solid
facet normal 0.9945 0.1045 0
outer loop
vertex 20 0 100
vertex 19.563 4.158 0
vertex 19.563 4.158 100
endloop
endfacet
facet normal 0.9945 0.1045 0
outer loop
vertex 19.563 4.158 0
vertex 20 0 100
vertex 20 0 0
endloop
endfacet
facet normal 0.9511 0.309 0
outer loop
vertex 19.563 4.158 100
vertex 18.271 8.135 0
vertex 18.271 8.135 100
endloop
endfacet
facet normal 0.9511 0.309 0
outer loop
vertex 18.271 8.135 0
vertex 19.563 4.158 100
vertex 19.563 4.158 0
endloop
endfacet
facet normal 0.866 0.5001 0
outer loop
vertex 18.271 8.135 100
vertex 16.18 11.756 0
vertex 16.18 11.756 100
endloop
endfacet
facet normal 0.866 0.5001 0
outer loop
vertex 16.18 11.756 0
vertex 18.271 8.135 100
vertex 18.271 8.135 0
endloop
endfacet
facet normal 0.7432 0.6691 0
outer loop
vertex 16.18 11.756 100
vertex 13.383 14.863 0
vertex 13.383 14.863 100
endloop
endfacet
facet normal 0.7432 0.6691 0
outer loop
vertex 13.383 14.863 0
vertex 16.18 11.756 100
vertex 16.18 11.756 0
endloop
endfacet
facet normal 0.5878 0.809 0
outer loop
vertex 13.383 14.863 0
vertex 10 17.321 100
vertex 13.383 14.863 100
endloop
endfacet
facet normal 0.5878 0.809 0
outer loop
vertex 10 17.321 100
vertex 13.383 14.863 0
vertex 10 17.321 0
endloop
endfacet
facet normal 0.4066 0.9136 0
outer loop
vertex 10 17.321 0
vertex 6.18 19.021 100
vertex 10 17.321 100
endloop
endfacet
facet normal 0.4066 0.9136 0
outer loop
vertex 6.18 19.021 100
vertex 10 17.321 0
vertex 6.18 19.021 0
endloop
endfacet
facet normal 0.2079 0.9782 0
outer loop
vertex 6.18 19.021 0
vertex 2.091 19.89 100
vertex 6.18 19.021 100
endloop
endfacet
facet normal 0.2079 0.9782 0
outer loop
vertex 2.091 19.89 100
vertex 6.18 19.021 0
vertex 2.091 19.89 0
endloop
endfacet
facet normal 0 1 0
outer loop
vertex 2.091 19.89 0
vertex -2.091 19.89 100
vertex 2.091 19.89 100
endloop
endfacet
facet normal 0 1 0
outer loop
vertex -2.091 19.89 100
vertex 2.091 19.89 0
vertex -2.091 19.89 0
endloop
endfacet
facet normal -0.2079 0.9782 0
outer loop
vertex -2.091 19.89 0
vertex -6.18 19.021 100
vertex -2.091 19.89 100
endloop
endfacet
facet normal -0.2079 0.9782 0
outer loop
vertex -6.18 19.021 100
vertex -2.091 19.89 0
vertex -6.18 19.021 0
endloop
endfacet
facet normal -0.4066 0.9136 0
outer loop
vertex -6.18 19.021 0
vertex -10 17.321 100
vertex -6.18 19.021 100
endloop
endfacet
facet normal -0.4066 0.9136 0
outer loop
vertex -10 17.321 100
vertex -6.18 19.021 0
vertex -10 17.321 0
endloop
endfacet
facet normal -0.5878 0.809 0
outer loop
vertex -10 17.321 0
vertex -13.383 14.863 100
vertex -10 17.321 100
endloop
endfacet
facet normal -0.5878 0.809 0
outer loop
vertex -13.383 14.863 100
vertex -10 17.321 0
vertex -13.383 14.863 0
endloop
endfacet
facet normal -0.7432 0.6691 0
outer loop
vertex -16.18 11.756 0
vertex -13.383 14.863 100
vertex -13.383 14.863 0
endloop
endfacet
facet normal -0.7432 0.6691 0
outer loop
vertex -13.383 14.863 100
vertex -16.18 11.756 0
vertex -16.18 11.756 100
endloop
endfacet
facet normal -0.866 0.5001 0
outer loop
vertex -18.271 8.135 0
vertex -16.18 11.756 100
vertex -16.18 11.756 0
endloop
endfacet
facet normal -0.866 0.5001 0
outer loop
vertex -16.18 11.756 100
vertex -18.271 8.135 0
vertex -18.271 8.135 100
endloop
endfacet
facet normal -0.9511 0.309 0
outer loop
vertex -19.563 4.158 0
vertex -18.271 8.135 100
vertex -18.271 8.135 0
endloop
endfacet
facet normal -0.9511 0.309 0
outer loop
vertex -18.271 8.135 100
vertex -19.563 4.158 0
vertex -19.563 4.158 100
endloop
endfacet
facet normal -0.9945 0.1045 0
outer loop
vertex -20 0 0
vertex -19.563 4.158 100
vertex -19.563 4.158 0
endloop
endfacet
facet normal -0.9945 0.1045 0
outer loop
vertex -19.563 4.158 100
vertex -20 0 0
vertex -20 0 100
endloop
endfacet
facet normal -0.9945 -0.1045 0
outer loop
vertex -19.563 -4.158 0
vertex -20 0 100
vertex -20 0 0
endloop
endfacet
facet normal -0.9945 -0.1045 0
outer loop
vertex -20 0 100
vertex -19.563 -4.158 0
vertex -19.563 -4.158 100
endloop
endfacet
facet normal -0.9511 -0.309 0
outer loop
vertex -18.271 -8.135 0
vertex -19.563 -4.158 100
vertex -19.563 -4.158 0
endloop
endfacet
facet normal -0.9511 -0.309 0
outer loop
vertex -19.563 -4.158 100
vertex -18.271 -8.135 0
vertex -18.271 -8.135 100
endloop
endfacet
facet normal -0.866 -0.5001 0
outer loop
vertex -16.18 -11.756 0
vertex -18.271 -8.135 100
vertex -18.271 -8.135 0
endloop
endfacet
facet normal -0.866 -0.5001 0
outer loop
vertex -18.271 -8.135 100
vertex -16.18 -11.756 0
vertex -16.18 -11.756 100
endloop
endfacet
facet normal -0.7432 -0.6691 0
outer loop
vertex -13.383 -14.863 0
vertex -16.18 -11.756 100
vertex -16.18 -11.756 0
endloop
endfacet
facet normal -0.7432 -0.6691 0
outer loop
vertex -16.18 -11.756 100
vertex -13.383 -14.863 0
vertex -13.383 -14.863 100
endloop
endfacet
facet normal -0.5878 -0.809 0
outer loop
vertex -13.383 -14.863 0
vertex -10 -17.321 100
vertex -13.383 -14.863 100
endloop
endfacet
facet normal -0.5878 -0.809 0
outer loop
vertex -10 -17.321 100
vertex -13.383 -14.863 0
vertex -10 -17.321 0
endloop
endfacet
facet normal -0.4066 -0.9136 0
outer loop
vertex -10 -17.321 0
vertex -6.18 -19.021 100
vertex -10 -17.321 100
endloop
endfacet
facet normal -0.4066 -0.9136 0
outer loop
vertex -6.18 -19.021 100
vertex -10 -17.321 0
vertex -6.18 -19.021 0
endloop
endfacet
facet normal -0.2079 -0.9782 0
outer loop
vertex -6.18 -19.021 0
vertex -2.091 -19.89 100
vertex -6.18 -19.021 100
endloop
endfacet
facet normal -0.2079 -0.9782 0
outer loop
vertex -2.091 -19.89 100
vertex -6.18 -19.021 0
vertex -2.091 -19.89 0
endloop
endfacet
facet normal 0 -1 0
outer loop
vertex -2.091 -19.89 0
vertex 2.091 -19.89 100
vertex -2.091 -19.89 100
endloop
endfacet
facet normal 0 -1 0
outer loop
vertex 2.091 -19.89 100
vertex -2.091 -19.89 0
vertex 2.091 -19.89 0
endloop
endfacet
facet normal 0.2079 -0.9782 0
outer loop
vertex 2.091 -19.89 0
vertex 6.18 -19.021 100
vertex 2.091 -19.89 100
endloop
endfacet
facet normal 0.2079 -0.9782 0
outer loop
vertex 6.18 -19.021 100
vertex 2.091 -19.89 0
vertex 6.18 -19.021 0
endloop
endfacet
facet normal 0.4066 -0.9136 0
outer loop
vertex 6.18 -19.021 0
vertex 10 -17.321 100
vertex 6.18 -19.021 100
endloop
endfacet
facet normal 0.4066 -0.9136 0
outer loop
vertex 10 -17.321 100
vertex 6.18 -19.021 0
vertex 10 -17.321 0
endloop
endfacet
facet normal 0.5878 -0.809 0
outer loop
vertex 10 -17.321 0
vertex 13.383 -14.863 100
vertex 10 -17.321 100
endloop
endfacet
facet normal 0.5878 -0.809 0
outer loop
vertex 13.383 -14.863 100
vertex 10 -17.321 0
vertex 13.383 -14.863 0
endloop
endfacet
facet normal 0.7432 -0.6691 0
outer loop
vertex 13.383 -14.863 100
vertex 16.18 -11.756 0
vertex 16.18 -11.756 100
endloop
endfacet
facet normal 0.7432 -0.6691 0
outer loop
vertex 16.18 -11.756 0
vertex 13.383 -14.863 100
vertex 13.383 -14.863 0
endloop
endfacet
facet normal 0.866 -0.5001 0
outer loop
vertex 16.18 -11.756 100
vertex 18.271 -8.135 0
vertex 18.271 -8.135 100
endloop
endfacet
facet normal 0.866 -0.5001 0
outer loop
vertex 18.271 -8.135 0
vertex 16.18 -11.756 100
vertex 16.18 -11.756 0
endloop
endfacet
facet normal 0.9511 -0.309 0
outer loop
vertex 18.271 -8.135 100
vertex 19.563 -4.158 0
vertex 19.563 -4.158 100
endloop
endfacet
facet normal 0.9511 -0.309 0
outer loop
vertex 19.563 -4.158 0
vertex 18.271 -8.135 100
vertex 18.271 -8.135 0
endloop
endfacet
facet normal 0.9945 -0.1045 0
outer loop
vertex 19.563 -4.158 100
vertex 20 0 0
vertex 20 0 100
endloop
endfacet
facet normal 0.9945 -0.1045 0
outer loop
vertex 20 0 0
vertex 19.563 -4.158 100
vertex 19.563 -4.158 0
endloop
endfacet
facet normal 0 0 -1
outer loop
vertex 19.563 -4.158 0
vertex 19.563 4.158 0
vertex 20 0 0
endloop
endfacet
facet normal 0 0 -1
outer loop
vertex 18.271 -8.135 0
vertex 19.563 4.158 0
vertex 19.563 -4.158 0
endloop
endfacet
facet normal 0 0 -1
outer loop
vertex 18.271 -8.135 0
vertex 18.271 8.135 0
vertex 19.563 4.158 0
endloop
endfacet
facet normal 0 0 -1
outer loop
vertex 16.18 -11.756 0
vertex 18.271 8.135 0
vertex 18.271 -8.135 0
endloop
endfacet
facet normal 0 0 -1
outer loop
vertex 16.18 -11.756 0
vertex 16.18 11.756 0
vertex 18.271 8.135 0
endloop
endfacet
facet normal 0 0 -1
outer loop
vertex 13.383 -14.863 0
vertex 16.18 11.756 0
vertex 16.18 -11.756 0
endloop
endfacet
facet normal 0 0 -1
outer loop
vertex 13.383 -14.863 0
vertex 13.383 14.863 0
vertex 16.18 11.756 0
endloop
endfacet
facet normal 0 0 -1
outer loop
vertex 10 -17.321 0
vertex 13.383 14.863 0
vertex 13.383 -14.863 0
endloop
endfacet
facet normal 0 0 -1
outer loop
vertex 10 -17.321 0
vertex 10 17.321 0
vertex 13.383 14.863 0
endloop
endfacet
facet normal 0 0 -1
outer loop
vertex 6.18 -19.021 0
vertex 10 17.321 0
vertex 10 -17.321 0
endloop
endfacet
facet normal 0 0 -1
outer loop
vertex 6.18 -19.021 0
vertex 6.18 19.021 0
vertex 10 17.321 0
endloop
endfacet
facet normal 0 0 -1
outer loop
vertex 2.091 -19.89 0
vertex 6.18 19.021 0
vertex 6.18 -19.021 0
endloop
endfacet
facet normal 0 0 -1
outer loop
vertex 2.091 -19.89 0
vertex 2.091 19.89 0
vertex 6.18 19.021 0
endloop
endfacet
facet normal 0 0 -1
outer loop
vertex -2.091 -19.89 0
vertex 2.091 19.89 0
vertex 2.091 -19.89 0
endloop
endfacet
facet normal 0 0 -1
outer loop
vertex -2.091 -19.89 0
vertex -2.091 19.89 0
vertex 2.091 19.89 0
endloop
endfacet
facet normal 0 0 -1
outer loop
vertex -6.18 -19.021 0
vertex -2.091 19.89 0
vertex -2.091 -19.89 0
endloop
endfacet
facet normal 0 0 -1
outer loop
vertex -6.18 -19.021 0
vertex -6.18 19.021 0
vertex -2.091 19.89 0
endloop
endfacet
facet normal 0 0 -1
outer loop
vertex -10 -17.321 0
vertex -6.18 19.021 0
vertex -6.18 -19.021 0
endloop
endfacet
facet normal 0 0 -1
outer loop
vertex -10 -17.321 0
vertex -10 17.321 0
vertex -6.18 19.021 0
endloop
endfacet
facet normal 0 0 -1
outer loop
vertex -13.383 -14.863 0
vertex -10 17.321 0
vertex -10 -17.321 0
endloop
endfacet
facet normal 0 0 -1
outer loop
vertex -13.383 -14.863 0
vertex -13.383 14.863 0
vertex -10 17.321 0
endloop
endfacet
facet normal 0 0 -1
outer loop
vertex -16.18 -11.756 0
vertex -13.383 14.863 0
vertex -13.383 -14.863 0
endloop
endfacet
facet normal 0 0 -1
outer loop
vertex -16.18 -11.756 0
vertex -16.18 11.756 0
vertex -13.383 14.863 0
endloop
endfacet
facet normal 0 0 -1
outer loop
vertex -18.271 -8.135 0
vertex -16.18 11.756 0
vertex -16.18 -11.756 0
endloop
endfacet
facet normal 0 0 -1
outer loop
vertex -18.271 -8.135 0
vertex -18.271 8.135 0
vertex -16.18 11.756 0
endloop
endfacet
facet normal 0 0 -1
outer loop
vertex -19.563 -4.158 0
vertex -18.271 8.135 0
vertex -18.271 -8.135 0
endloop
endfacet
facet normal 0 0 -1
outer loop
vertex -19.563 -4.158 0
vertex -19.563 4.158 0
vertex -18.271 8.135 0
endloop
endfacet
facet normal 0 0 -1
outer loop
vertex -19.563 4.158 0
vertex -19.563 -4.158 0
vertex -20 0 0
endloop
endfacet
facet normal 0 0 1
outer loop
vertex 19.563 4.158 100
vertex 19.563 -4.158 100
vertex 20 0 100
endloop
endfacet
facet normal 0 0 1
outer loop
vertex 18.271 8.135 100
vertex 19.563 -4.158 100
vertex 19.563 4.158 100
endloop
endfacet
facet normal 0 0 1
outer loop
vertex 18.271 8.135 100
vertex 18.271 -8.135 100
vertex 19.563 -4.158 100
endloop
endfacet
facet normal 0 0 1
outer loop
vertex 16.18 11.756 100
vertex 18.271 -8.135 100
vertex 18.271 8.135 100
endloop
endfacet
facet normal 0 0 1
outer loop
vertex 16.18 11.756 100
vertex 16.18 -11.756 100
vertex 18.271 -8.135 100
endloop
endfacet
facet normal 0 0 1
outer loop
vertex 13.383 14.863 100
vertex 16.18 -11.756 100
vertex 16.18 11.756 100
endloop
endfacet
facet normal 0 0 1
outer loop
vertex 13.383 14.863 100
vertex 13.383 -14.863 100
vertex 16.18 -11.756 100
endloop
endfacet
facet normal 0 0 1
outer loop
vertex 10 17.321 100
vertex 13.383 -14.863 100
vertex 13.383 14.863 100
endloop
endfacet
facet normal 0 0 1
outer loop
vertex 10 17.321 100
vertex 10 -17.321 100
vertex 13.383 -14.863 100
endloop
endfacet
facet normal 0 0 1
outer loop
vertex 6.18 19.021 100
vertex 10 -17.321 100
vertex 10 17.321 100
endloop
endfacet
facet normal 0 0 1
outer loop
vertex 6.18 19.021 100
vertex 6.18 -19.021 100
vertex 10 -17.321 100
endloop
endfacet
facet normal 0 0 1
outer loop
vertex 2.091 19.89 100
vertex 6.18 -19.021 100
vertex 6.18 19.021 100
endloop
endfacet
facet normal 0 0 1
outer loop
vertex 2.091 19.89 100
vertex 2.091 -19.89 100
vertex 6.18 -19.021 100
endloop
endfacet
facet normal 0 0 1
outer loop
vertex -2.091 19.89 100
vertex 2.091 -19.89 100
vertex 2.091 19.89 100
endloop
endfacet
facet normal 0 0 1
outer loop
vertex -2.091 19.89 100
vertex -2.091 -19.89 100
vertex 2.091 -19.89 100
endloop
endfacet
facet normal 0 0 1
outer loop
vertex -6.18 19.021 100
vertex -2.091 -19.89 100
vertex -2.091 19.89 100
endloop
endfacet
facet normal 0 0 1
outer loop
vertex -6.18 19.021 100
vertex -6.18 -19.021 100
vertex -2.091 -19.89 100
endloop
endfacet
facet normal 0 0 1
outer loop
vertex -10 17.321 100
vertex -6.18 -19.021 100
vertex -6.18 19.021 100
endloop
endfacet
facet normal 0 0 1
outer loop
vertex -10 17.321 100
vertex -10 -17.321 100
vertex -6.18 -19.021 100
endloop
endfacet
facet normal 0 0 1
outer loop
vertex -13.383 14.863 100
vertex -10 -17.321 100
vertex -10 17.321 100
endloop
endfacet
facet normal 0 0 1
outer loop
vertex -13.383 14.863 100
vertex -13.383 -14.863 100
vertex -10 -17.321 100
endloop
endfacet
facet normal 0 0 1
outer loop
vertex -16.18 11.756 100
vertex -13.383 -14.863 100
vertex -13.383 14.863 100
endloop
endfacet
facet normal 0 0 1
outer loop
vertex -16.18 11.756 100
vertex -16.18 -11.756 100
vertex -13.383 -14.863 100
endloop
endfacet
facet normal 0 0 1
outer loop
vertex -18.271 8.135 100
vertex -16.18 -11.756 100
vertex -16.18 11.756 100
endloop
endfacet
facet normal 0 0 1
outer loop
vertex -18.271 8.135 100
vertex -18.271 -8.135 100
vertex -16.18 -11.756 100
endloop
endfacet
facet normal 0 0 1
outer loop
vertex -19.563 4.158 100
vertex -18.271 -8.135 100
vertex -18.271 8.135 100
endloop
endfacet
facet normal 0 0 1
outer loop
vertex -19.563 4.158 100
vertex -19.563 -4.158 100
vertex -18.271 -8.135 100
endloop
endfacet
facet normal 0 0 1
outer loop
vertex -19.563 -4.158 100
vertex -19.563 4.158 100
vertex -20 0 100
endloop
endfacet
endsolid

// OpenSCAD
// Unit of length: Unit.INCH
cylinder(h = 100.0, d = 40.0, center = false, $fa = 12.0, $fs = 2.0, $fn = 0);
